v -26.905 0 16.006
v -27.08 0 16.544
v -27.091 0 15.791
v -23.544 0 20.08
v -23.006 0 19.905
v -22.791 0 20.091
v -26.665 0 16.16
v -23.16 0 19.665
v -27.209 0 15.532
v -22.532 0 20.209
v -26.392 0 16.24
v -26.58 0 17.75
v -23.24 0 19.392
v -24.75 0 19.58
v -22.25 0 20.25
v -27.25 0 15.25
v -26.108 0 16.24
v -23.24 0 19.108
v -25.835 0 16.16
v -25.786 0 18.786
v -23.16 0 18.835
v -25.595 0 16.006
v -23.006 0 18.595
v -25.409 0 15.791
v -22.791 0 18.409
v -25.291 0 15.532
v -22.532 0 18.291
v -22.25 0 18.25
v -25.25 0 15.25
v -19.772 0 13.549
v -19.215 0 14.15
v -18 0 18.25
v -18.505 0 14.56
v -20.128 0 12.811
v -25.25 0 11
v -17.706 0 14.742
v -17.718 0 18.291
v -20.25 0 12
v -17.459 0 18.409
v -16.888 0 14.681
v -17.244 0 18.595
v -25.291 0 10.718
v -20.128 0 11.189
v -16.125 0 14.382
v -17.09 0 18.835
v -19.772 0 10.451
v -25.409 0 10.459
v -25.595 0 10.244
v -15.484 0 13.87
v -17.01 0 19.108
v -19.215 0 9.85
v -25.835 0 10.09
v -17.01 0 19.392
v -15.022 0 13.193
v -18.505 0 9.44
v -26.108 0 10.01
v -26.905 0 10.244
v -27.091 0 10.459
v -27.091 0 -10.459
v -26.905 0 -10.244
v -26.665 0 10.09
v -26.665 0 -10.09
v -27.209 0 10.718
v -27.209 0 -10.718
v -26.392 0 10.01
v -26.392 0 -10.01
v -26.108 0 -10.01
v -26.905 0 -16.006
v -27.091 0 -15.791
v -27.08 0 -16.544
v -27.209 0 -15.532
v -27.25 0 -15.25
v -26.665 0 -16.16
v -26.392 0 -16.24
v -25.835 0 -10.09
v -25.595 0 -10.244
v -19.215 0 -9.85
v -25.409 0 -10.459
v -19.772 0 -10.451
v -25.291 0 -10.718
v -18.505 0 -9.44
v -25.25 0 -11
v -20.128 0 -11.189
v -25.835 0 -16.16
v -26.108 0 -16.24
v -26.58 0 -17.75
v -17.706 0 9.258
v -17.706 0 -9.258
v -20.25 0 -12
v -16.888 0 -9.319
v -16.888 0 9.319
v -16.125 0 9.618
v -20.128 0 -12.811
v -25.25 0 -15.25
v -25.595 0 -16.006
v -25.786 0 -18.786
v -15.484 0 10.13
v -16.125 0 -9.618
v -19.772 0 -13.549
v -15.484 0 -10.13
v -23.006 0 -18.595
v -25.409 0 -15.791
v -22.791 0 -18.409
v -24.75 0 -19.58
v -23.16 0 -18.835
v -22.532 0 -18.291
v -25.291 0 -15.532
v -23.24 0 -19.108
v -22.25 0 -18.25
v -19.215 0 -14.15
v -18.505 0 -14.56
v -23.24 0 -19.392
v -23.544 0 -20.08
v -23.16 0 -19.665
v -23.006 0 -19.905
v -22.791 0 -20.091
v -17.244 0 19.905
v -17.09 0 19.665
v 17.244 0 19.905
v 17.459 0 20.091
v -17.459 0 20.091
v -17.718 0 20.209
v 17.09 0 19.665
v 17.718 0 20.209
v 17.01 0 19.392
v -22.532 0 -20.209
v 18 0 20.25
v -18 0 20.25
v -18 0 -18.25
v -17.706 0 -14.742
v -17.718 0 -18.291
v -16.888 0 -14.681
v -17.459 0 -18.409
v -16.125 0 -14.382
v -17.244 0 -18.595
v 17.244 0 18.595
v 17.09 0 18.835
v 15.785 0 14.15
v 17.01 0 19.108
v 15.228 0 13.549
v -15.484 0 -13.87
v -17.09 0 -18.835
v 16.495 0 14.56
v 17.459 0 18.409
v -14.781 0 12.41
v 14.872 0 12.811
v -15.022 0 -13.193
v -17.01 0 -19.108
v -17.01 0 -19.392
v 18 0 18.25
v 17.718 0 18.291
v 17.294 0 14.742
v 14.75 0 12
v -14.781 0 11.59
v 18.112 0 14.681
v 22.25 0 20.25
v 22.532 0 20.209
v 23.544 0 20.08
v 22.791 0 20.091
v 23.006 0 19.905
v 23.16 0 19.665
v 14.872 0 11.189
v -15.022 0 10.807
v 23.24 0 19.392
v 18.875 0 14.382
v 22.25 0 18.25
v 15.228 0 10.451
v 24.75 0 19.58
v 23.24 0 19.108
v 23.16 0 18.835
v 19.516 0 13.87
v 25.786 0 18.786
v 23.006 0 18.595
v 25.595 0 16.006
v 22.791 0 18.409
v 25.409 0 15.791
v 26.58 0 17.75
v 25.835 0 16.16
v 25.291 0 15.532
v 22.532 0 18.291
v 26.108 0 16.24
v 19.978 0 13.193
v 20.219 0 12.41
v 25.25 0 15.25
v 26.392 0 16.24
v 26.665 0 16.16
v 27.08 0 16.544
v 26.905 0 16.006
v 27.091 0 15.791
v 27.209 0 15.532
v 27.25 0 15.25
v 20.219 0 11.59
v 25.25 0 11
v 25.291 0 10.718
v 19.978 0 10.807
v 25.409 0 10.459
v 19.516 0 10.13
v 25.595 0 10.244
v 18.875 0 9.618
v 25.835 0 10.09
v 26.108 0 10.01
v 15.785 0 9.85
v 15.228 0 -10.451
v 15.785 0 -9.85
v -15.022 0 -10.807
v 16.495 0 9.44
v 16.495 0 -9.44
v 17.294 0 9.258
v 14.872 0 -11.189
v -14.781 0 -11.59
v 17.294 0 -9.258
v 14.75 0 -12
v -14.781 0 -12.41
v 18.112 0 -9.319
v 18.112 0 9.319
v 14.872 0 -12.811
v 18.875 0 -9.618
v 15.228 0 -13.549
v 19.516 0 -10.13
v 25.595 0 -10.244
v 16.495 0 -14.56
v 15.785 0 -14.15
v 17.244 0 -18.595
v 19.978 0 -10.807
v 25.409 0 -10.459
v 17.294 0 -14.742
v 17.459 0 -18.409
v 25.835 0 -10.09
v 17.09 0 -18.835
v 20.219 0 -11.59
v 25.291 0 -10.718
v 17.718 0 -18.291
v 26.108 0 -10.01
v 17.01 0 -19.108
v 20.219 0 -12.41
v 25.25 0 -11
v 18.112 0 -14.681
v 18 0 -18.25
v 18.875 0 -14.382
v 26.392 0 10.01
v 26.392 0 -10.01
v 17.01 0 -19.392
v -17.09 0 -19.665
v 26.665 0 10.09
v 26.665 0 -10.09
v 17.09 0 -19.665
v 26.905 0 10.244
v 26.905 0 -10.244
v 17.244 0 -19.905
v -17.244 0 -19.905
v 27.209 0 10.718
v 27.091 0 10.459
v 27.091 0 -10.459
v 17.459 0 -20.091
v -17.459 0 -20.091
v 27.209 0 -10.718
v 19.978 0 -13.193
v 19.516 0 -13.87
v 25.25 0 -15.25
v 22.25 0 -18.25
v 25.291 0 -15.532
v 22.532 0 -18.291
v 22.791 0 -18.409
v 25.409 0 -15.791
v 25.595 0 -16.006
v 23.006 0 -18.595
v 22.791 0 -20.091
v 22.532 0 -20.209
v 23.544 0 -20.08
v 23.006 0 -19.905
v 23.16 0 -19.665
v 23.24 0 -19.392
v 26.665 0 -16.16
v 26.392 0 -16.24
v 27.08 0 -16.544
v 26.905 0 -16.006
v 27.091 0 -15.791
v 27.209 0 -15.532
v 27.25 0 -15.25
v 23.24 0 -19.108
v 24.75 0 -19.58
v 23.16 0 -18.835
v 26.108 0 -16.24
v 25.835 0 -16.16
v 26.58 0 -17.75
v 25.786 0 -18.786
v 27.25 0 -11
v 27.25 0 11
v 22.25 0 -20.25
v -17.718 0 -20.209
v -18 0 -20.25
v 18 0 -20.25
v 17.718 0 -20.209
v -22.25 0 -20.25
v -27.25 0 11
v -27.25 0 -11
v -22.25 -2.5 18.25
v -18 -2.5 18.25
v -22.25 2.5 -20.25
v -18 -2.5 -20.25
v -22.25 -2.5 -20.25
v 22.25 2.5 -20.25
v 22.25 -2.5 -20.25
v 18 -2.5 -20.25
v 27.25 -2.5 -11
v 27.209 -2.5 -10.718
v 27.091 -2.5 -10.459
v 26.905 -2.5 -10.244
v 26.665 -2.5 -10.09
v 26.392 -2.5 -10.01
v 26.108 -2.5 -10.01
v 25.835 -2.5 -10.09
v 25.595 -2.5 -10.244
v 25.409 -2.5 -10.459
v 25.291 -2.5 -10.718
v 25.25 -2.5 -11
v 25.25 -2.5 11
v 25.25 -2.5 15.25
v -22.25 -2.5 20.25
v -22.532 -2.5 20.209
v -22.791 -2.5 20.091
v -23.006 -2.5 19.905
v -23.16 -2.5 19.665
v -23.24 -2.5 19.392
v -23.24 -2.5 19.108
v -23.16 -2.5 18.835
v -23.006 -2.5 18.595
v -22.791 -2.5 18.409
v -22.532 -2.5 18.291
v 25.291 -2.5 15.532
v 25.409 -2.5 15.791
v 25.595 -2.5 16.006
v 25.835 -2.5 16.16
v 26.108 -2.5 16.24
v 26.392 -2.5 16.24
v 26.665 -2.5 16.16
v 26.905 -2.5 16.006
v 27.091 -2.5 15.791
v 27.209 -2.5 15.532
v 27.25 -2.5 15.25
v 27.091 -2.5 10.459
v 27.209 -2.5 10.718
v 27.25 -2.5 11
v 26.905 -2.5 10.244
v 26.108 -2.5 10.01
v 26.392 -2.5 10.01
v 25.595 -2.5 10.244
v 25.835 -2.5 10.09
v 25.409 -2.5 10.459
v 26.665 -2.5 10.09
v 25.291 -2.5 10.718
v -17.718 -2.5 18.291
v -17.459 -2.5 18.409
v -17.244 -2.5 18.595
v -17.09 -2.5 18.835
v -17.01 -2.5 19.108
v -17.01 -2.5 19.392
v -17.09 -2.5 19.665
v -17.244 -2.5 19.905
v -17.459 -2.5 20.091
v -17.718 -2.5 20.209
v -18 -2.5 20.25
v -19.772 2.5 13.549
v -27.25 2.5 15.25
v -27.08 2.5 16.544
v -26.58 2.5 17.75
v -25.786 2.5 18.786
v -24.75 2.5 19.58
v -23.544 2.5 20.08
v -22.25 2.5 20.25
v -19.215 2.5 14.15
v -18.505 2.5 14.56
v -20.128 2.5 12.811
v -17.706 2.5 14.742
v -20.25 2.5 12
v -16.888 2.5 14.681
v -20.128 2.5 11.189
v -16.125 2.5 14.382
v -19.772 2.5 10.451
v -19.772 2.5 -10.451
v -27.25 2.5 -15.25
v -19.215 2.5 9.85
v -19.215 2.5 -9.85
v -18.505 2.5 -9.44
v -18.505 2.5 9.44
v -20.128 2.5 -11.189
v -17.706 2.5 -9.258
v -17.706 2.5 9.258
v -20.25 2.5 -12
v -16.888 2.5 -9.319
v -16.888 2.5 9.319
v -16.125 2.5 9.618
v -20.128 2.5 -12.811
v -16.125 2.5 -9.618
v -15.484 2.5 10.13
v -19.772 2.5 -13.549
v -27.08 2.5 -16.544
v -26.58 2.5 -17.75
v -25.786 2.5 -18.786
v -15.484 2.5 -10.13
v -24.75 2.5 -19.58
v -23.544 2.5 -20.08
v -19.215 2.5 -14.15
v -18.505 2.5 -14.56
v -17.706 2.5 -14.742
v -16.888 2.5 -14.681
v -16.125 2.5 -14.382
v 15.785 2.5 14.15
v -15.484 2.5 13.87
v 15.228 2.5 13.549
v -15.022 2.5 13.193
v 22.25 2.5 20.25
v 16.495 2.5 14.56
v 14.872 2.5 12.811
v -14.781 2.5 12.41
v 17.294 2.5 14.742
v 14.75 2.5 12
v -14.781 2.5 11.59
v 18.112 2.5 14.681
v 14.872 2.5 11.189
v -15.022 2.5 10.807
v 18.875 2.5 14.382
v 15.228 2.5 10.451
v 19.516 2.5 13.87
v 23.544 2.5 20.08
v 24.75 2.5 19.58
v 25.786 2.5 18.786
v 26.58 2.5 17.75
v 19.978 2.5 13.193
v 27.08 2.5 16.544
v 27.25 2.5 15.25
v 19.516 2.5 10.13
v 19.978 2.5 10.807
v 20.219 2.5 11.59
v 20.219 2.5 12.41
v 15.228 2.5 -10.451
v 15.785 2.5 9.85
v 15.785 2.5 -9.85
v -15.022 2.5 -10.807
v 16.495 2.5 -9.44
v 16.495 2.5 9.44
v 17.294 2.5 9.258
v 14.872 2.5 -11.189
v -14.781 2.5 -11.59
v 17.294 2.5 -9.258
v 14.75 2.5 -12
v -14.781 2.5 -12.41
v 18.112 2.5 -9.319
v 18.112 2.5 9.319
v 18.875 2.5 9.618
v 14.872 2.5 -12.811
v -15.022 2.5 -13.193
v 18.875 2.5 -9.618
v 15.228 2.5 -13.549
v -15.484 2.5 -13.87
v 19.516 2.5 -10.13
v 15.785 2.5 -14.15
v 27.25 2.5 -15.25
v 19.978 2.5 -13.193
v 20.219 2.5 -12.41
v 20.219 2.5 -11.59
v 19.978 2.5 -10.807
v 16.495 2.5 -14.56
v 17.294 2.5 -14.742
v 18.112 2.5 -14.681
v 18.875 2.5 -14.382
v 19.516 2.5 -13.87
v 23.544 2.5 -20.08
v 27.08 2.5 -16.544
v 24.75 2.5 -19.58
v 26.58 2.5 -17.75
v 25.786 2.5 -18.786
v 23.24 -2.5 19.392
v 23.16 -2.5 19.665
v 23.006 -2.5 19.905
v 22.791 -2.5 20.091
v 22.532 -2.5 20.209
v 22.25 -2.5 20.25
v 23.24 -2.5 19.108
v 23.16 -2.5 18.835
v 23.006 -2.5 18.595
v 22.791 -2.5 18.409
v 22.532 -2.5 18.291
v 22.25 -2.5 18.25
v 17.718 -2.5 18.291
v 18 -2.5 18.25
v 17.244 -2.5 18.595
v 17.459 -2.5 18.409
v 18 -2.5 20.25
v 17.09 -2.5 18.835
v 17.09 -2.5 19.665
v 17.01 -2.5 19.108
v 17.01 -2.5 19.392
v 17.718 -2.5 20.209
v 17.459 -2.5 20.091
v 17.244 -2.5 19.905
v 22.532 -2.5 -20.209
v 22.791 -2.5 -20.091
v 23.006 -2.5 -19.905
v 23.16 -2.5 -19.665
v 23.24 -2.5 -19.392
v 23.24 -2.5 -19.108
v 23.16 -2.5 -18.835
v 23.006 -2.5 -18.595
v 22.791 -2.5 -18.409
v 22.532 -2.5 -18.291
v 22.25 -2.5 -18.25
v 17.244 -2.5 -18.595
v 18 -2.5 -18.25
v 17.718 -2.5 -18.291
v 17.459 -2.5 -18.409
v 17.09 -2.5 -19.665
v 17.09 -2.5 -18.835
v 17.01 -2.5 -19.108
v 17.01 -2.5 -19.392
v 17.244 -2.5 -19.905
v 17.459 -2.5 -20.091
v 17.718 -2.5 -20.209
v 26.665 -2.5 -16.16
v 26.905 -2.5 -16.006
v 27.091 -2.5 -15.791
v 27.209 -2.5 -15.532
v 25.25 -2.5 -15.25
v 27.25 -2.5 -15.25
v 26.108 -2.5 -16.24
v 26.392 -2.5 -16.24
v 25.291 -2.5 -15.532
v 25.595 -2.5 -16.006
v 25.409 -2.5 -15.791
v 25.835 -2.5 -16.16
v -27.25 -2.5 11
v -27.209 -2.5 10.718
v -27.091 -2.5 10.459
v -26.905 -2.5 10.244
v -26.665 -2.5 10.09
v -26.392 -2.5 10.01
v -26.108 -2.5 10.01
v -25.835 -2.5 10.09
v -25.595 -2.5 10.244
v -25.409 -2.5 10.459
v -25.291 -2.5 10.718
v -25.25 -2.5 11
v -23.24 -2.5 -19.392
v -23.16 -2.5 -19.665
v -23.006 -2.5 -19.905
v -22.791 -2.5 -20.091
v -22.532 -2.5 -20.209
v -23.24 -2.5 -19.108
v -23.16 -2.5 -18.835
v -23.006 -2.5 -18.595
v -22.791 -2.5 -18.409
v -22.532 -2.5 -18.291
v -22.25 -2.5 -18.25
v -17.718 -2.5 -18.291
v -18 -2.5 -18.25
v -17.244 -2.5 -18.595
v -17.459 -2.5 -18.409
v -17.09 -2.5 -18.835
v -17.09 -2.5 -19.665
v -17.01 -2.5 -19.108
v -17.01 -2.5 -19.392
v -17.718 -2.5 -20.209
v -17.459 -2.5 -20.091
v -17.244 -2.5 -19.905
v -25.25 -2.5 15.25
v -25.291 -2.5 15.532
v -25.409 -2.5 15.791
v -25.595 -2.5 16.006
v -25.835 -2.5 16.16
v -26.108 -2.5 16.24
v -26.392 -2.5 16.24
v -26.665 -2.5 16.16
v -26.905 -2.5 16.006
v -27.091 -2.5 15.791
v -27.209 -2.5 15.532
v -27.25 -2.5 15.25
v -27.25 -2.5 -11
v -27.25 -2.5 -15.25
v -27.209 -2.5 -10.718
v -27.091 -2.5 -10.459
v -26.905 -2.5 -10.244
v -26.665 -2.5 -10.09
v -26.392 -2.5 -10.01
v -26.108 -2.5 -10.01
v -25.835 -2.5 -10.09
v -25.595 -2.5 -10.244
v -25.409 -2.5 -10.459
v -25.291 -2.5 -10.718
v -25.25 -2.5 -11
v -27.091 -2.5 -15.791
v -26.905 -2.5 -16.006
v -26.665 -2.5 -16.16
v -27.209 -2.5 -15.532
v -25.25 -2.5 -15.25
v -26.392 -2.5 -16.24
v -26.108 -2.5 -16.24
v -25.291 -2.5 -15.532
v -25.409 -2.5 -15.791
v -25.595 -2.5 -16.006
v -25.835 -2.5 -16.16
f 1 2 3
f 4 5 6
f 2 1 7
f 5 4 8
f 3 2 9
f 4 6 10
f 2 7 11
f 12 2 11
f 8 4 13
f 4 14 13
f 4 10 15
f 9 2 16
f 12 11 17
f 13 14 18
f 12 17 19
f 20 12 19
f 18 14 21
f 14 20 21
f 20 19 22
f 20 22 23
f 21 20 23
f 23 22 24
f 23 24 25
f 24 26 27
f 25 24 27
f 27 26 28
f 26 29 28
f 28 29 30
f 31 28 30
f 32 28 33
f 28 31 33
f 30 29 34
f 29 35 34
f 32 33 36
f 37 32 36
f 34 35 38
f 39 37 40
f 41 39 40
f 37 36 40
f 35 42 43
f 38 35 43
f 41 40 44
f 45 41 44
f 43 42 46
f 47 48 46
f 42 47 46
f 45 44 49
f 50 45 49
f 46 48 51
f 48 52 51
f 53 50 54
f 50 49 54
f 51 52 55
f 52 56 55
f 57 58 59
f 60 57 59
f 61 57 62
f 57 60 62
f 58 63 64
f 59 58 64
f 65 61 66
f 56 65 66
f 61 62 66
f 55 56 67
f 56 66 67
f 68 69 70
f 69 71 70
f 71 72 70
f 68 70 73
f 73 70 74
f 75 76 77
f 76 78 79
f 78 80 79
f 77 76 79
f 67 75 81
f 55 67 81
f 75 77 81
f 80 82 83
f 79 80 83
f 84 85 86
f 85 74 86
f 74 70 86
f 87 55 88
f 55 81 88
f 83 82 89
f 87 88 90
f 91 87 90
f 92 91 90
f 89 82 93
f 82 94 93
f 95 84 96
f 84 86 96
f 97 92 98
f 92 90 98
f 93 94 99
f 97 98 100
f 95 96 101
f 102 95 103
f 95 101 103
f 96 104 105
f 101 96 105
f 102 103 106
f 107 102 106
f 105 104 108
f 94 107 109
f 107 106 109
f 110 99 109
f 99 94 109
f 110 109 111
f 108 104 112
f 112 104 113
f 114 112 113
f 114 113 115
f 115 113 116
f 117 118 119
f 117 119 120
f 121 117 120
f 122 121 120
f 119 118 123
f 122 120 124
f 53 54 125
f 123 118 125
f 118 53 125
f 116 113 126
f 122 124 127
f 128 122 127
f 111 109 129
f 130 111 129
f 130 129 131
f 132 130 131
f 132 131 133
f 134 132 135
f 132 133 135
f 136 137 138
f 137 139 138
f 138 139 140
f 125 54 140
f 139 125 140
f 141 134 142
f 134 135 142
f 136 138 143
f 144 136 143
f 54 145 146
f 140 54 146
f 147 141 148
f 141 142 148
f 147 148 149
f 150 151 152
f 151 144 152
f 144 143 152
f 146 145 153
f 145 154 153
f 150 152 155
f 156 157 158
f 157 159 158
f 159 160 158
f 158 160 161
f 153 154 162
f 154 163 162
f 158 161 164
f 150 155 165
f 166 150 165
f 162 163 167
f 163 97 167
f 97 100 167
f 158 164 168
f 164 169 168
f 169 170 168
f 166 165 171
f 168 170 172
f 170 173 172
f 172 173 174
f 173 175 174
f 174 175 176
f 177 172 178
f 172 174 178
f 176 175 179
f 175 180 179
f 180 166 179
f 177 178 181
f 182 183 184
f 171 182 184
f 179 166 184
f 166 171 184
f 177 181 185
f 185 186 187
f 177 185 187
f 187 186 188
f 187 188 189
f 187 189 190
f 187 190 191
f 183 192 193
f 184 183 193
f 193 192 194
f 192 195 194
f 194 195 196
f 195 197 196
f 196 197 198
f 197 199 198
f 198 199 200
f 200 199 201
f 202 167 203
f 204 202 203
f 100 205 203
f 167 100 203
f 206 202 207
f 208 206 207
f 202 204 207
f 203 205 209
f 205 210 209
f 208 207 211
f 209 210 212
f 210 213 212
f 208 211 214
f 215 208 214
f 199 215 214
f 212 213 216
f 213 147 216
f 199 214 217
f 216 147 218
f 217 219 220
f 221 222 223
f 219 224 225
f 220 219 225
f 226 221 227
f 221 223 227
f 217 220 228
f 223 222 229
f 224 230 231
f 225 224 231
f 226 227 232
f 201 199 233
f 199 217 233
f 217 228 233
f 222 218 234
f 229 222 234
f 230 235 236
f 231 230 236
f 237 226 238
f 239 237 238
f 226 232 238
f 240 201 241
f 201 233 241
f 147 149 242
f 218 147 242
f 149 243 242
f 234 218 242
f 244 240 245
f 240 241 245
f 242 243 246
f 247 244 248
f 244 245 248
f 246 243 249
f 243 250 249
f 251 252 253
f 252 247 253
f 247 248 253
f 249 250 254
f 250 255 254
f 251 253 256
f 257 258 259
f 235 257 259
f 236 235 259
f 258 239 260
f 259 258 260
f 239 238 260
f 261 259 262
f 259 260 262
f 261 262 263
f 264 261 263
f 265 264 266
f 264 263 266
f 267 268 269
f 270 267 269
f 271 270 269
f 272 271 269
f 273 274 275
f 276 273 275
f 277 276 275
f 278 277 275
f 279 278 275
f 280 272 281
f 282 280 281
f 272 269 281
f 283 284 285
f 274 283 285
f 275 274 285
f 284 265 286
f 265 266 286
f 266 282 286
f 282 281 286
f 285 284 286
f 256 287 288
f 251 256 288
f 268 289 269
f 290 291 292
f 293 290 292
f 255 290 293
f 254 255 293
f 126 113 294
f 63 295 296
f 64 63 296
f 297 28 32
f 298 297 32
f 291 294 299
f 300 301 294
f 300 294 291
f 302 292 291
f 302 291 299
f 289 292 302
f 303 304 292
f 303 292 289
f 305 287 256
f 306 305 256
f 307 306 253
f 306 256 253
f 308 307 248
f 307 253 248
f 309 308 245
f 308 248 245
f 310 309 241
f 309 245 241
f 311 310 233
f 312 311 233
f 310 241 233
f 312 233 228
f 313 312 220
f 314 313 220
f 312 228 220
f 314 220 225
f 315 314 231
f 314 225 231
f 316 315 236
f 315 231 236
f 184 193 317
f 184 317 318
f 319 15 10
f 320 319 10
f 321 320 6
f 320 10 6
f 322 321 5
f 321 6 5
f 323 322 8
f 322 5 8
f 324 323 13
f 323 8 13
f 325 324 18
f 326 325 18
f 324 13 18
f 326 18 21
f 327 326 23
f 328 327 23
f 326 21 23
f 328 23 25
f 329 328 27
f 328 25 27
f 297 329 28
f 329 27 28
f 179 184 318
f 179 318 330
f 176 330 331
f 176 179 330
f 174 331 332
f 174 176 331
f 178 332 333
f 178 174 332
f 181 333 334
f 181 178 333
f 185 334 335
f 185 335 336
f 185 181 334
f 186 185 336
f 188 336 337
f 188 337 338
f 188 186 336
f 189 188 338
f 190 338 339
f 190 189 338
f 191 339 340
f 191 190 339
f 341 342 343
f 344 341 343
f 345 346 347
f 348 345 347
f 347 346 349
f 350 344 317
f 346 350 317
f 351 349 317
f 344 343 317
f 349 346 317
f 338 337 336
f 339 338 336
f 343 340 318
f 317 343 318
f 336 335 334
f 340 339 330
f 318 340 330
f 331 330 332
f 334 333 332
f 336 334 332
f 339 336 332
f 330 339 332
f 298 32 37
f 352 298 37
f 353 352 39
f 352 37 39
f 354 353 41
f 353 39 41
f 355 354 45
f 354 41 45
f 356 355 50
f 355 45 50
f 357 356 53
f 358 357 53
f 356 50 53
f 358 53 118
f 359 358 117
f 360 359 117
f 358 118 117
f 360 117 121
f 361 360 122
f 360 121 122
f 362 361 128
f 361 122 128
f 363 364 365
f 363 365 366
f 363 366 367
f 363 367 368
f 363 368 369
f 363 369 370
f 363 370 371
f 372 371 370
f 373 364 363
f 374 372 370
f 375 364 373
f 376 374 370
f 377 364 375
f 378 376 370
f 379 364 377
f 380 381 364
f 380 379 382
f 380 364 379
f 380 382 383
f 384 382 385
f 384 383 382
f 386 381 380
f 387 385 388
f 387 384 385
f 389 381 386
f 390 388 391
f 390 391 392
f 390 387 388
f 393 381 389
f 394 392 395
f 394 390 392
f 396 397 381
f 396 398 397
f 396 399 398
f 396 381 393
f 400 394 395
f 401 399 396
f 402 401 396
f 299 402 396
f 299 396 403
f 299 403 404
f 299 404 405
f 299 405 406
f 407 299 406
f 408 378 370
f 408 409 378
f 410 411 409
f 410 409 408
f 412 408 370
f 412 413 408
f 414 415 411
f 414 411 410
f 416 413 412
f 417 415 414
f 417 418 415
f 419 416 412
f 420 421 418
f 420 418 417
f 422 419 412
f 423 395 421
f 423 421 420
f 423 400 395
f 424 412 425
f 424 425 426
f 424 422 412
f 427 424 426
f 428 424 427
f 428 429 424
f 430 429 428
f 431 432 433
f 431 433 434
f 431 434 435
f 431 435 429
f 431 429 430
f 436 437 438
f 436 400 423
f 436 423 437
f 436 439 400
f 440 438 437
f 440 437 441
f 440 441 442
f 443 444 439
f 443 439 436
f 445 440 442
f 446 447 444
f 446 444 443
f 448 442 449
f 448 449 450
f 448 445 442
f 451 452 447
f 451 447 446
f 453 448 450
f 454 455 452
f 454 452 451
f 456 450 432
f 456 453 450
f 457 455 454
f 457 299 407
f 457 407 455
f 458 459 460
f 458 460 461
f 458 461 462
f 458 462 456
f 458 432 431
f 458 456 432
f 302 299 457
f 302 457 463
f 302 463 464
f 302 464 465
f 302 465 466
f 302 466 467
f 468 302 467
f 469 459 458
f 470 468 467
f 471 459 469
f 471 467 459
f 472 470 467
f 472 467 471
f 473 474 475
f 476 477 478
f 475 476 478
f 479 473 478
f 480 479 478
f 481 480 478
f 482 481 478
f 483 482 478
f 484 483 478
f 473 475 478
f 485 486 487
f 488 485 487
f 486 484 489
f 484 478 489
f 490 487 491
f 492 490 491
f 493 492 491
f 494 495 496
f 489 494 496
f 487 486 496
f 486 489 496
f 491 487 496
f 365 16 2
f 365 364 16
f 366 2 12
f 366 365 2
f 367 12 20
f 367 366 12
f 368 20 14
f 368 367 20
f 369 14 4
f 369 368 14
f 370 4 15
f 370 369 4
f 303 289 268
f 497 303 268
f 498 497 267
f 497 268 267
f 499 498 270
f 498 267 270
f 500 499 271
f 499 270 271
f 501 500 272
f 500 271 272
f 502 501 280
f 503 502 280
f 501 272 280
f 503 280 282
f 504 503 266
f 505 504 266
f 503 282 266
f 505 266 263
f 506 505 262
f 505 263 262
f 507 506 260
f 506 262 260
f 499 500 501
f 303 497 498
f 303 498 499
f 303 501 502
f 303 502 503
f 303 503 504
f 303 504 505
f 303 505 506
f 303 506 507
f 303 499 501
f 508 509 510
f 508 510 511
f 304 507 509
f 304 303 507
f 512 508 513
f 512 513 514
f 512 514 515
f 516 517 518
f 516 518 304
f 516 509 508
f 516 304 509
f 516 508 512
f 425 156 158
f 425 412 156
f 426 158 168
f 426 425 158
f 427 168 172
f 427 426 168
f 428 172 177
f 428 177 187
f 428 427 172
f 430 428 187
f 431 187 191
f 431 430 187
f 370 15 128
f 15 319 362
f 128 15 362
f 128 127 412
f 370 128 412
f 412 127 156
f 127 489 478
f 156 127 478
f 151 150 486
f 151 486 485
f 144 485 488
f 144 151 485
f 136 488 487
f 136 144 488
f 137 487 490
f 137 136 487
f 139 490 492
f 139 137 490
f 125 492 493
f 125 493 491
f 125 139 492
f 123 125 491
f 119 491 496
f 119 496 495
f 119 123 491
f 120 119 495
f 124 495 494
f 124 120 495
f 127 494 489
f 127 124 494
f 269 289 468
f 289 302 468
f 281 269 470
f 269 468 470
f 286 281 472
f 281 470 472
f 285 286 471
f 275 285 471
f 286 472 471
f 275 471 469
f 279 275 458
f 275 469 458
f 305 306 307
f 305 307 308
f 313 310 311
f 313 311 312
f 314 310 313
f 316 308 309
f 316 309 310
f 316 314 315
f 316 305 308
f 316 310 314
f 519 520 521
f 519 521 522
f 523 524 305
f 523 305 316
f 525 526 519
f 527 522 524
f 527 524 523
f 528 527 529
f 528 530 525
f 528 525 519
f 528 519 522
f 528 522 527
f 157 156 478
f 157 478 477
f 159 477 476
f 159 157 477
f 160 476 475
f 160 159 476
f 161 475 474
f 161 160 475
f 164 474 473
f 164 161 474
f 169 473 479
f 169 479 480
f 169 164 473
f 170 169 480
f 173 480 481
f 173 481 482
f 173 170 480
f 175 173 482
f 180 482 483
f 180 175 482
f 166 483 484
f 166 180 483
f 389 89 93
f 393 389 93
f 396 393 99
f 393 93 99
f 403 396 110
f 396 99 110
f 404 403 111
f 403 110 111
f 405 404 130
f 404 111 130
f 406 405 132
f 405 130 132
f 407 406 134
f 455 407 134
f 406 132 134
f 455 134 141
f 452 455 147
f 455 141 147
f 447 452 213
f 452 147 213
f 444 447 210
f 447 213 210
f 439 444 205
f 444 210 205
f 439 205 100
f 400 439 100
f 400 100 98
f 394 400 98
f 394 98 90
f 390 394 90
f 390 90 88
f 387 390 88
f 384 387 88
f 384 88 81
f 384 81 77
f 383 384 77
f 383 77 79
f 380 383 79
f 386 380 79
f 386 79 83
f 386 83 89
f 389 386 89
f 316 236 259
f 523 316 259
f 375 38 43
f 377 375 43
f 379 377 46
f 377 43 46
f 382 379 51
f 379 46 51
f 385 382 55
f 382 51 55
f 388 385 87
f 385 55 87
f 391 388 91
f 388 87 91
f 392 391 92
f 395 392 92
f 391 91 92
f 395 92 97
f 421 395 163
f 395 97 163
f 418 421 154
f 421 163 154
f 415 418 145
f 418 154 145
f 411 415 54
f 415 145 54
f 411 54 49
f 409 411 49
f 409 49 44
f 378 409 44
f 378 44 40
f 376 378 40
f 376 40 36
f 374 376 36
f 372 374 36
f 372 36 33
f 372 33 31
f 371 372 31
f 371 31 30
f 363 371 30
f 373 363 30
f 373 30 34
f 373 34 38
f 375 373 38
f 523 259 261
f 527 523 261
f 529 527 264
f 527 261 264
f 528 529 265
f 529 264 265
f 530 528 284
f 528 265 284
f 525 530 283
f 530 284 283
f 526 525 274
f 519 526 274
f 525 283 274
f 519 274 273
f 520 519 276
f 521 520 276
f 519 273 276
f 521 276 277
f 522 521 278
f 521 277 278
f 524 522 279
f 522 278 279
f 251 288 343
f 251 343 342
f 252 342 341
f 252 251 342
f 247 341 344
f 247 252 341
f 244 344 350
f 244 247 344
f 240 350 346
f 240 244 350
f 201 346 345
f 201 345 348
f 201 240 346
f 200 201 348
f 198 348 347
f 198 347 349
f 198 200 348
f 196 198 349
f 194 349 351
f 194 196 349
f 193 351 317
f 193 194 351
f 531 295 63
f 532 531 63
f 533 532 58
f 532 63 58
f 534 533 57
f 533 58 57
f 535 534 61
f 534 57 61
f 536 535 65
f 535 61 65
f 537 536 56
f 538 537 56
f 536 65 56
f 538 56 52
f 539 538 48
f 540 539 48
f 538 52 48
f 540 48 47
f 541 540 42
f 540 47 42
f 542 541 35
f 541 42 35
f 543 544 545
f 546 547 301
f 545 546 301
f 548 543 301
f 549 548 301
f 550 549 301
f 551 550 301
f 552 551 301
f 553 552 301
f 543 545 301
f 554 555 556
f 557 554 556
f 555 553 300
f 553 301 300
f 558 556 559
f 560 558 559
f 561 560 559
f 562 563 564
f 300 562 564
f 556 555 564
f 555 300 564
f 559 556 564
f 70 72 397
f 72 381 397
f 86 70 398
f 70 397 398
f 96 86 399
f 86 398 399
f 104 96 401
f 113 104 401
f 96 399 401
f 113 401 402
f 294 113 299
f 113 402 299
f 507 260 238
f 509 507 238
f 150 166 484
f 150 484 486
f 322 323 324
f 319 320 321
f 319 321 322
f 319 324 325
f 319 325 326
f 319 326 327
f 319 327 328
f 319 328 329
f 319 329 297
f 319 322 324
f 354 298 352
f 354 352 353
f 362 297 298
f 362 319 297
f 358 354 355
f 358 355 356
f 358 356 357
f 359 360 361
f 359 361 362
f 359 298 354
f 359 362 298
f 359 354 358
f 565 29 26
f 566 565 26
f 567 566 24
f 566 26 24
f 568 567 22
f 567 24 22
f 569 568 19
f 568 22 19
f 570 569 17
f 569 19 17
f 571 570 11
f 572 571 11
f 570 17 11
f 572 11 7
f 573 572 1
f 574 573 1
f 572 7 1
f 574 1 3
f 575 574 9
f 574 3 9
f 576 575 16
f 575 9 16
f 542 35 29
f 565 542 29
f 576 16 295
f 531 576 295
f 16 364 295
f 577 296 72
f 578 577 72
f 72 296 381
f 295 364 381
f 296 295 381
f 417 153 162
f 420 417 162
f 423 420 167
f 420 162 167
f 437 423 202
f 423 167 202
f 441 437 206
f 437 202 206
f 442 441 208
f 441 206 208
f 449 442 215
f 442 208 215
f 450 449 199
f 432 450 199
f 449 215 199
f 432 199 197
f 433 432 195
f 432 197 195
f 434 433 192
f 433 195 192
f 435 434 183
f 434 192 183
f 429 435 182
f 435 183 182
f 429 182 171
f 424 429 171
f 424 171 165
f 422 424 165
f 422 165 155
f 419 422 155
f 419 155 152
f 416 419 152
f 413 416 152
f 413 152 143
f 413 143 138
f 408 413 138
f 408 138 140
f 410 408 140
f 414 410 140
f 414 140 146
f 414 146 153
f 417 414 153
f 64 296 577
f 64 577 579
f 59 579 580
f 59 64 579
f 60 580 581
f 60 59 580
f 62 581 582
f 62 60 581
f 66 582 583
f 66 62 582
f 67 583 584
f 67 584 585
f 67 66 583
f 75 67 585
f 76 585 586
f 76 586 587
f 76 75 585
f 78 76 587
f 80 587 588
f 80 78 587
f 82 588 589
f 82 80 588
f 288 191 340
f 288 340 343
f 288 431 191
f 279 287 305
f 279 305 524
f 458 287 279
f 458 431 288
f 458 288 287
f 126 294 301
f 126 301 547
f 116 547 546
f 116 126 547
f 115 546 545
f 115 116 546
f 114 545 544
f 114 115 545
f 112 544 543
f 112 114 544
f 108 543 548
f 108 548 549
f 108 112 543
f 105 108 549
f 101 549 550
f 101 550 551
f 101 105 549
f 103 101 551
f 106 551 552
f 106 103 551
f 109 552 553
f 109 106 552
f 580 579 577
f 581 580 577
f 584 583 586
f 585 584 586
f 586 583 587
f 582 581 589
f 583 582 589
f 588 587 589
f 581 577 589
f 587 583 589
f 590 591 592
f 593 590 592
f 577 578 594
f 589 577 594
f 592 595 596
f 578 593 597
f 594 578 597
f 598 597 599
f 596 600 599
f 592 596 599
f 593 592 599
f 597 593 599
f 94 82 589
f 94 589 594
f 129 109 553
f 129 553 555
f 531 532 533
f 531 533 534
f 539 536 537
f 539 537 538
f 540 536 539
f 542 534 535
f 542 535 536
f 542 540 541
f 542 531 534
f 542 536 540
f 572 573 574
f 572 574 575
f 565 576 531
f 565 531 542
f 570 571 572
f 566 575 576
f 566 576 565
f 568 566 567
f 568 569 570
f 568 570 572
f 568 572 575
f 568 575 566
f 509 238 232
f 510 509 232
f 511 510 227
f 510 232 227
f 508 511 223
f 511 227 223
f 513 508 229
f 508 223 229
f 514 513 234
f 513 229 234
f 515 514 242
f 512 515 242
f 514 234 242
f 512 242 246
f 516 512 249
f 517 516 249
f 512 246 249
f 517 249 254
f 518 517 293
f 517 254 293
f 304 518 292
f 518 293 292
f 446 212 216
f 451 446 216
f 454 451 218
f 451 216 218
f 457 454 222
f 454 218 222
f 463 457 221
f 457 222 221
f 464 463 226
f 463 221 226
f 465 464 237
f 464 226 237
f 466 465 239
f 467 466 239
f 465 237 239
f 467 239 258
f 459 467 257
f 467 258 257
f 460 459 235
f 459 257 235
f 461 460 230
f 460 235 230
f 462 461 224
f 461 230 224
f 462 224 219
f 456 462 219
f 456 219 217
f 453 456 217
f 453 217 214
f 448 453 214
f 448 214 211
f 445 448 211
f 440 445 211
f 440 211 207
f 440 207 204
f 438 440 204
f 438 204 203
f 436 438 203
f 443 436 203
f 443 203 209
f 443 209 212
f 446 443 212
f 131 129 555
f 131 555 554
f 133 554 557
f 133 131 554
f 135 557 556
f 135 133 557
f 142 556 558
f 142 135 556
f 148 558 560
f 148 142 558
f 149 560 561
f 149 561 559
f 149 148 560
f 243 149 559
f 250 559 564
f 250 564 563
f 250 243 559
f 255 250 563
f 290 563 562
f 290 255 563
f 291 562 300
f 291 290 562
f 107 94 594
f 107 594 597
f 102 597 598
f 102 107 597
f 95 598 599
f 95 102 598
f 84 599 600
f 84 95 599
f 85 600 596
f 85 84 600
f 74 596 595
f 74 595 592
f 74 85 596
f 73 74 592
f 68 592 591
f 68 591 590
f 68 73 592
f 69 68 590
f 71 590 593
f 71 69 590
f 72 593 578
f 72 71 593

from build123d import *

# Parameters (mm, degrees)
SKETCH1_W            = 54.5
SKETCH1_H            = 40.5
BOSS_EXTRUDE1_DEPTH  = 2.5
M5_CLEARANCE_HOLE1_D = 5.5
FILLET1_R            = 5
BOSS_EXTRUDE2_DEPTH  = 2.5
MIRROR2_COPY_1_DEPTH = 2.5


with BuildPart() as part:
    # Sketch1 → Boss-Extrude1 (new body)
    with BuildSketch(Plane(origin=(0, 0, 0), x_dir=(1, 0, 0), z_dir=(0, 1, 0))):
        Rectangle(SKETCH1_W, SKETCH1_H)
    extrude(amount=BOSS_EXTRUDE1_DEPTH)

    # M5 Clearance Hole1 (through all)
    with Locations(Plane(origin=(0, 2.5, 0), x_dir=(1, 0, 0), z_dir=(0, 1, 0))):
        with Locations((17.5, -12), (-17.5, 12), (-17.5, -12), (17.5, 12)):
            Hole(M5_CLEARANCE_HOLE1_D / 2)

    # Fillet1
    fillet1_edges = [part.edges().sort_by_distance(p)[0] for p in [
        (-27.25, 1.25, -20.25),
        (27.25, 1.25, -20.25),
        (27.25, 1.25, 20.25),
        (-27.25, 1.25, 20.25),
    ]]
    fillet(fillet1_edges, radius=FILLET1_R)

    # Sketch2 → Boss-Extrude2 (add)
    with BuildSketch(Plane(origin=(0, 0, 0), x_dir=(1, 0, 0), z_dir=(0, 1, 0))):
        with BuildLine():
            Line((-25.25, 11), (-25.25, 15.25))
            ThreePointArc((-25.25, 15.25), (-26.25, 16.25), (-27.25, 15.25))
            Line((-27.25, 15.25), (-27.25, 11))
            ThreePointArc((-27.25, 11), (-26.25, 10), (-25.25, 11))
        make_face()
        with BuildLine():
            Line((-22.25, 18.25), (-18, 18.25))
            ThreePointArc((-18, 18.25), (-17, 19.25), (-18, 20.25))
            Line((-18, 20.25), (-22.25, 20.25))
            ThreePointArc((-22.25, 20.25), (-23.25, 19.25), (-22.25, 18.25))
        make_face()
    boss_extrude2 = extrude(amount=-BOSS_EXTRUDE2_DEPTH)

    # Mirror1: Boss-Extrude2 across plane
    add(boss_extrude2.mirror(Plane.XY))

    # Mirror2: Boss-Extrude2 across plane
    add(boss_extrude2.mirror(Plane(origin=(0, 0, 0), x_dir=(0, 0, 1), z_dir=(1, 0, 0))))

    # Mirror2 copy 1 sketch → Mirror2 copy 1 (add)
    with BuildSketch(Plane(origin=(0, 0, 0), x_dir=(-1, 0, 0), z_dir=(0, 1, 0))):
        with BuildLine():
            Line((-25.25, 11), (-25.25, 15.25))
            ThreePointArc((-25.25, 15.25), (-26.25, 16.25), (-27.25, 15.25))
            Line((-27.25, 15.25), (-27.25, 11))
            ThreePointArc((-27.25, 11), (-26.25, 10), (-25.25, 11))
        make_face()
        with BuildLine():
            Line((-22.25, 18.25), (-18, 18.25))
            ThreePointArc((-18, 18.25), (-17, 19.25), (-18, 20.25))
            Line((-18, 20.25), (-22.25, 20.25))
            ThreePointArc((-22.25, 20.25), (-23.25, 19.25), (-22.25, 18.25))
        make_face()
    extrude(amount=-MIRROR2_COPY_1_DEPTH)


solid = part.part
